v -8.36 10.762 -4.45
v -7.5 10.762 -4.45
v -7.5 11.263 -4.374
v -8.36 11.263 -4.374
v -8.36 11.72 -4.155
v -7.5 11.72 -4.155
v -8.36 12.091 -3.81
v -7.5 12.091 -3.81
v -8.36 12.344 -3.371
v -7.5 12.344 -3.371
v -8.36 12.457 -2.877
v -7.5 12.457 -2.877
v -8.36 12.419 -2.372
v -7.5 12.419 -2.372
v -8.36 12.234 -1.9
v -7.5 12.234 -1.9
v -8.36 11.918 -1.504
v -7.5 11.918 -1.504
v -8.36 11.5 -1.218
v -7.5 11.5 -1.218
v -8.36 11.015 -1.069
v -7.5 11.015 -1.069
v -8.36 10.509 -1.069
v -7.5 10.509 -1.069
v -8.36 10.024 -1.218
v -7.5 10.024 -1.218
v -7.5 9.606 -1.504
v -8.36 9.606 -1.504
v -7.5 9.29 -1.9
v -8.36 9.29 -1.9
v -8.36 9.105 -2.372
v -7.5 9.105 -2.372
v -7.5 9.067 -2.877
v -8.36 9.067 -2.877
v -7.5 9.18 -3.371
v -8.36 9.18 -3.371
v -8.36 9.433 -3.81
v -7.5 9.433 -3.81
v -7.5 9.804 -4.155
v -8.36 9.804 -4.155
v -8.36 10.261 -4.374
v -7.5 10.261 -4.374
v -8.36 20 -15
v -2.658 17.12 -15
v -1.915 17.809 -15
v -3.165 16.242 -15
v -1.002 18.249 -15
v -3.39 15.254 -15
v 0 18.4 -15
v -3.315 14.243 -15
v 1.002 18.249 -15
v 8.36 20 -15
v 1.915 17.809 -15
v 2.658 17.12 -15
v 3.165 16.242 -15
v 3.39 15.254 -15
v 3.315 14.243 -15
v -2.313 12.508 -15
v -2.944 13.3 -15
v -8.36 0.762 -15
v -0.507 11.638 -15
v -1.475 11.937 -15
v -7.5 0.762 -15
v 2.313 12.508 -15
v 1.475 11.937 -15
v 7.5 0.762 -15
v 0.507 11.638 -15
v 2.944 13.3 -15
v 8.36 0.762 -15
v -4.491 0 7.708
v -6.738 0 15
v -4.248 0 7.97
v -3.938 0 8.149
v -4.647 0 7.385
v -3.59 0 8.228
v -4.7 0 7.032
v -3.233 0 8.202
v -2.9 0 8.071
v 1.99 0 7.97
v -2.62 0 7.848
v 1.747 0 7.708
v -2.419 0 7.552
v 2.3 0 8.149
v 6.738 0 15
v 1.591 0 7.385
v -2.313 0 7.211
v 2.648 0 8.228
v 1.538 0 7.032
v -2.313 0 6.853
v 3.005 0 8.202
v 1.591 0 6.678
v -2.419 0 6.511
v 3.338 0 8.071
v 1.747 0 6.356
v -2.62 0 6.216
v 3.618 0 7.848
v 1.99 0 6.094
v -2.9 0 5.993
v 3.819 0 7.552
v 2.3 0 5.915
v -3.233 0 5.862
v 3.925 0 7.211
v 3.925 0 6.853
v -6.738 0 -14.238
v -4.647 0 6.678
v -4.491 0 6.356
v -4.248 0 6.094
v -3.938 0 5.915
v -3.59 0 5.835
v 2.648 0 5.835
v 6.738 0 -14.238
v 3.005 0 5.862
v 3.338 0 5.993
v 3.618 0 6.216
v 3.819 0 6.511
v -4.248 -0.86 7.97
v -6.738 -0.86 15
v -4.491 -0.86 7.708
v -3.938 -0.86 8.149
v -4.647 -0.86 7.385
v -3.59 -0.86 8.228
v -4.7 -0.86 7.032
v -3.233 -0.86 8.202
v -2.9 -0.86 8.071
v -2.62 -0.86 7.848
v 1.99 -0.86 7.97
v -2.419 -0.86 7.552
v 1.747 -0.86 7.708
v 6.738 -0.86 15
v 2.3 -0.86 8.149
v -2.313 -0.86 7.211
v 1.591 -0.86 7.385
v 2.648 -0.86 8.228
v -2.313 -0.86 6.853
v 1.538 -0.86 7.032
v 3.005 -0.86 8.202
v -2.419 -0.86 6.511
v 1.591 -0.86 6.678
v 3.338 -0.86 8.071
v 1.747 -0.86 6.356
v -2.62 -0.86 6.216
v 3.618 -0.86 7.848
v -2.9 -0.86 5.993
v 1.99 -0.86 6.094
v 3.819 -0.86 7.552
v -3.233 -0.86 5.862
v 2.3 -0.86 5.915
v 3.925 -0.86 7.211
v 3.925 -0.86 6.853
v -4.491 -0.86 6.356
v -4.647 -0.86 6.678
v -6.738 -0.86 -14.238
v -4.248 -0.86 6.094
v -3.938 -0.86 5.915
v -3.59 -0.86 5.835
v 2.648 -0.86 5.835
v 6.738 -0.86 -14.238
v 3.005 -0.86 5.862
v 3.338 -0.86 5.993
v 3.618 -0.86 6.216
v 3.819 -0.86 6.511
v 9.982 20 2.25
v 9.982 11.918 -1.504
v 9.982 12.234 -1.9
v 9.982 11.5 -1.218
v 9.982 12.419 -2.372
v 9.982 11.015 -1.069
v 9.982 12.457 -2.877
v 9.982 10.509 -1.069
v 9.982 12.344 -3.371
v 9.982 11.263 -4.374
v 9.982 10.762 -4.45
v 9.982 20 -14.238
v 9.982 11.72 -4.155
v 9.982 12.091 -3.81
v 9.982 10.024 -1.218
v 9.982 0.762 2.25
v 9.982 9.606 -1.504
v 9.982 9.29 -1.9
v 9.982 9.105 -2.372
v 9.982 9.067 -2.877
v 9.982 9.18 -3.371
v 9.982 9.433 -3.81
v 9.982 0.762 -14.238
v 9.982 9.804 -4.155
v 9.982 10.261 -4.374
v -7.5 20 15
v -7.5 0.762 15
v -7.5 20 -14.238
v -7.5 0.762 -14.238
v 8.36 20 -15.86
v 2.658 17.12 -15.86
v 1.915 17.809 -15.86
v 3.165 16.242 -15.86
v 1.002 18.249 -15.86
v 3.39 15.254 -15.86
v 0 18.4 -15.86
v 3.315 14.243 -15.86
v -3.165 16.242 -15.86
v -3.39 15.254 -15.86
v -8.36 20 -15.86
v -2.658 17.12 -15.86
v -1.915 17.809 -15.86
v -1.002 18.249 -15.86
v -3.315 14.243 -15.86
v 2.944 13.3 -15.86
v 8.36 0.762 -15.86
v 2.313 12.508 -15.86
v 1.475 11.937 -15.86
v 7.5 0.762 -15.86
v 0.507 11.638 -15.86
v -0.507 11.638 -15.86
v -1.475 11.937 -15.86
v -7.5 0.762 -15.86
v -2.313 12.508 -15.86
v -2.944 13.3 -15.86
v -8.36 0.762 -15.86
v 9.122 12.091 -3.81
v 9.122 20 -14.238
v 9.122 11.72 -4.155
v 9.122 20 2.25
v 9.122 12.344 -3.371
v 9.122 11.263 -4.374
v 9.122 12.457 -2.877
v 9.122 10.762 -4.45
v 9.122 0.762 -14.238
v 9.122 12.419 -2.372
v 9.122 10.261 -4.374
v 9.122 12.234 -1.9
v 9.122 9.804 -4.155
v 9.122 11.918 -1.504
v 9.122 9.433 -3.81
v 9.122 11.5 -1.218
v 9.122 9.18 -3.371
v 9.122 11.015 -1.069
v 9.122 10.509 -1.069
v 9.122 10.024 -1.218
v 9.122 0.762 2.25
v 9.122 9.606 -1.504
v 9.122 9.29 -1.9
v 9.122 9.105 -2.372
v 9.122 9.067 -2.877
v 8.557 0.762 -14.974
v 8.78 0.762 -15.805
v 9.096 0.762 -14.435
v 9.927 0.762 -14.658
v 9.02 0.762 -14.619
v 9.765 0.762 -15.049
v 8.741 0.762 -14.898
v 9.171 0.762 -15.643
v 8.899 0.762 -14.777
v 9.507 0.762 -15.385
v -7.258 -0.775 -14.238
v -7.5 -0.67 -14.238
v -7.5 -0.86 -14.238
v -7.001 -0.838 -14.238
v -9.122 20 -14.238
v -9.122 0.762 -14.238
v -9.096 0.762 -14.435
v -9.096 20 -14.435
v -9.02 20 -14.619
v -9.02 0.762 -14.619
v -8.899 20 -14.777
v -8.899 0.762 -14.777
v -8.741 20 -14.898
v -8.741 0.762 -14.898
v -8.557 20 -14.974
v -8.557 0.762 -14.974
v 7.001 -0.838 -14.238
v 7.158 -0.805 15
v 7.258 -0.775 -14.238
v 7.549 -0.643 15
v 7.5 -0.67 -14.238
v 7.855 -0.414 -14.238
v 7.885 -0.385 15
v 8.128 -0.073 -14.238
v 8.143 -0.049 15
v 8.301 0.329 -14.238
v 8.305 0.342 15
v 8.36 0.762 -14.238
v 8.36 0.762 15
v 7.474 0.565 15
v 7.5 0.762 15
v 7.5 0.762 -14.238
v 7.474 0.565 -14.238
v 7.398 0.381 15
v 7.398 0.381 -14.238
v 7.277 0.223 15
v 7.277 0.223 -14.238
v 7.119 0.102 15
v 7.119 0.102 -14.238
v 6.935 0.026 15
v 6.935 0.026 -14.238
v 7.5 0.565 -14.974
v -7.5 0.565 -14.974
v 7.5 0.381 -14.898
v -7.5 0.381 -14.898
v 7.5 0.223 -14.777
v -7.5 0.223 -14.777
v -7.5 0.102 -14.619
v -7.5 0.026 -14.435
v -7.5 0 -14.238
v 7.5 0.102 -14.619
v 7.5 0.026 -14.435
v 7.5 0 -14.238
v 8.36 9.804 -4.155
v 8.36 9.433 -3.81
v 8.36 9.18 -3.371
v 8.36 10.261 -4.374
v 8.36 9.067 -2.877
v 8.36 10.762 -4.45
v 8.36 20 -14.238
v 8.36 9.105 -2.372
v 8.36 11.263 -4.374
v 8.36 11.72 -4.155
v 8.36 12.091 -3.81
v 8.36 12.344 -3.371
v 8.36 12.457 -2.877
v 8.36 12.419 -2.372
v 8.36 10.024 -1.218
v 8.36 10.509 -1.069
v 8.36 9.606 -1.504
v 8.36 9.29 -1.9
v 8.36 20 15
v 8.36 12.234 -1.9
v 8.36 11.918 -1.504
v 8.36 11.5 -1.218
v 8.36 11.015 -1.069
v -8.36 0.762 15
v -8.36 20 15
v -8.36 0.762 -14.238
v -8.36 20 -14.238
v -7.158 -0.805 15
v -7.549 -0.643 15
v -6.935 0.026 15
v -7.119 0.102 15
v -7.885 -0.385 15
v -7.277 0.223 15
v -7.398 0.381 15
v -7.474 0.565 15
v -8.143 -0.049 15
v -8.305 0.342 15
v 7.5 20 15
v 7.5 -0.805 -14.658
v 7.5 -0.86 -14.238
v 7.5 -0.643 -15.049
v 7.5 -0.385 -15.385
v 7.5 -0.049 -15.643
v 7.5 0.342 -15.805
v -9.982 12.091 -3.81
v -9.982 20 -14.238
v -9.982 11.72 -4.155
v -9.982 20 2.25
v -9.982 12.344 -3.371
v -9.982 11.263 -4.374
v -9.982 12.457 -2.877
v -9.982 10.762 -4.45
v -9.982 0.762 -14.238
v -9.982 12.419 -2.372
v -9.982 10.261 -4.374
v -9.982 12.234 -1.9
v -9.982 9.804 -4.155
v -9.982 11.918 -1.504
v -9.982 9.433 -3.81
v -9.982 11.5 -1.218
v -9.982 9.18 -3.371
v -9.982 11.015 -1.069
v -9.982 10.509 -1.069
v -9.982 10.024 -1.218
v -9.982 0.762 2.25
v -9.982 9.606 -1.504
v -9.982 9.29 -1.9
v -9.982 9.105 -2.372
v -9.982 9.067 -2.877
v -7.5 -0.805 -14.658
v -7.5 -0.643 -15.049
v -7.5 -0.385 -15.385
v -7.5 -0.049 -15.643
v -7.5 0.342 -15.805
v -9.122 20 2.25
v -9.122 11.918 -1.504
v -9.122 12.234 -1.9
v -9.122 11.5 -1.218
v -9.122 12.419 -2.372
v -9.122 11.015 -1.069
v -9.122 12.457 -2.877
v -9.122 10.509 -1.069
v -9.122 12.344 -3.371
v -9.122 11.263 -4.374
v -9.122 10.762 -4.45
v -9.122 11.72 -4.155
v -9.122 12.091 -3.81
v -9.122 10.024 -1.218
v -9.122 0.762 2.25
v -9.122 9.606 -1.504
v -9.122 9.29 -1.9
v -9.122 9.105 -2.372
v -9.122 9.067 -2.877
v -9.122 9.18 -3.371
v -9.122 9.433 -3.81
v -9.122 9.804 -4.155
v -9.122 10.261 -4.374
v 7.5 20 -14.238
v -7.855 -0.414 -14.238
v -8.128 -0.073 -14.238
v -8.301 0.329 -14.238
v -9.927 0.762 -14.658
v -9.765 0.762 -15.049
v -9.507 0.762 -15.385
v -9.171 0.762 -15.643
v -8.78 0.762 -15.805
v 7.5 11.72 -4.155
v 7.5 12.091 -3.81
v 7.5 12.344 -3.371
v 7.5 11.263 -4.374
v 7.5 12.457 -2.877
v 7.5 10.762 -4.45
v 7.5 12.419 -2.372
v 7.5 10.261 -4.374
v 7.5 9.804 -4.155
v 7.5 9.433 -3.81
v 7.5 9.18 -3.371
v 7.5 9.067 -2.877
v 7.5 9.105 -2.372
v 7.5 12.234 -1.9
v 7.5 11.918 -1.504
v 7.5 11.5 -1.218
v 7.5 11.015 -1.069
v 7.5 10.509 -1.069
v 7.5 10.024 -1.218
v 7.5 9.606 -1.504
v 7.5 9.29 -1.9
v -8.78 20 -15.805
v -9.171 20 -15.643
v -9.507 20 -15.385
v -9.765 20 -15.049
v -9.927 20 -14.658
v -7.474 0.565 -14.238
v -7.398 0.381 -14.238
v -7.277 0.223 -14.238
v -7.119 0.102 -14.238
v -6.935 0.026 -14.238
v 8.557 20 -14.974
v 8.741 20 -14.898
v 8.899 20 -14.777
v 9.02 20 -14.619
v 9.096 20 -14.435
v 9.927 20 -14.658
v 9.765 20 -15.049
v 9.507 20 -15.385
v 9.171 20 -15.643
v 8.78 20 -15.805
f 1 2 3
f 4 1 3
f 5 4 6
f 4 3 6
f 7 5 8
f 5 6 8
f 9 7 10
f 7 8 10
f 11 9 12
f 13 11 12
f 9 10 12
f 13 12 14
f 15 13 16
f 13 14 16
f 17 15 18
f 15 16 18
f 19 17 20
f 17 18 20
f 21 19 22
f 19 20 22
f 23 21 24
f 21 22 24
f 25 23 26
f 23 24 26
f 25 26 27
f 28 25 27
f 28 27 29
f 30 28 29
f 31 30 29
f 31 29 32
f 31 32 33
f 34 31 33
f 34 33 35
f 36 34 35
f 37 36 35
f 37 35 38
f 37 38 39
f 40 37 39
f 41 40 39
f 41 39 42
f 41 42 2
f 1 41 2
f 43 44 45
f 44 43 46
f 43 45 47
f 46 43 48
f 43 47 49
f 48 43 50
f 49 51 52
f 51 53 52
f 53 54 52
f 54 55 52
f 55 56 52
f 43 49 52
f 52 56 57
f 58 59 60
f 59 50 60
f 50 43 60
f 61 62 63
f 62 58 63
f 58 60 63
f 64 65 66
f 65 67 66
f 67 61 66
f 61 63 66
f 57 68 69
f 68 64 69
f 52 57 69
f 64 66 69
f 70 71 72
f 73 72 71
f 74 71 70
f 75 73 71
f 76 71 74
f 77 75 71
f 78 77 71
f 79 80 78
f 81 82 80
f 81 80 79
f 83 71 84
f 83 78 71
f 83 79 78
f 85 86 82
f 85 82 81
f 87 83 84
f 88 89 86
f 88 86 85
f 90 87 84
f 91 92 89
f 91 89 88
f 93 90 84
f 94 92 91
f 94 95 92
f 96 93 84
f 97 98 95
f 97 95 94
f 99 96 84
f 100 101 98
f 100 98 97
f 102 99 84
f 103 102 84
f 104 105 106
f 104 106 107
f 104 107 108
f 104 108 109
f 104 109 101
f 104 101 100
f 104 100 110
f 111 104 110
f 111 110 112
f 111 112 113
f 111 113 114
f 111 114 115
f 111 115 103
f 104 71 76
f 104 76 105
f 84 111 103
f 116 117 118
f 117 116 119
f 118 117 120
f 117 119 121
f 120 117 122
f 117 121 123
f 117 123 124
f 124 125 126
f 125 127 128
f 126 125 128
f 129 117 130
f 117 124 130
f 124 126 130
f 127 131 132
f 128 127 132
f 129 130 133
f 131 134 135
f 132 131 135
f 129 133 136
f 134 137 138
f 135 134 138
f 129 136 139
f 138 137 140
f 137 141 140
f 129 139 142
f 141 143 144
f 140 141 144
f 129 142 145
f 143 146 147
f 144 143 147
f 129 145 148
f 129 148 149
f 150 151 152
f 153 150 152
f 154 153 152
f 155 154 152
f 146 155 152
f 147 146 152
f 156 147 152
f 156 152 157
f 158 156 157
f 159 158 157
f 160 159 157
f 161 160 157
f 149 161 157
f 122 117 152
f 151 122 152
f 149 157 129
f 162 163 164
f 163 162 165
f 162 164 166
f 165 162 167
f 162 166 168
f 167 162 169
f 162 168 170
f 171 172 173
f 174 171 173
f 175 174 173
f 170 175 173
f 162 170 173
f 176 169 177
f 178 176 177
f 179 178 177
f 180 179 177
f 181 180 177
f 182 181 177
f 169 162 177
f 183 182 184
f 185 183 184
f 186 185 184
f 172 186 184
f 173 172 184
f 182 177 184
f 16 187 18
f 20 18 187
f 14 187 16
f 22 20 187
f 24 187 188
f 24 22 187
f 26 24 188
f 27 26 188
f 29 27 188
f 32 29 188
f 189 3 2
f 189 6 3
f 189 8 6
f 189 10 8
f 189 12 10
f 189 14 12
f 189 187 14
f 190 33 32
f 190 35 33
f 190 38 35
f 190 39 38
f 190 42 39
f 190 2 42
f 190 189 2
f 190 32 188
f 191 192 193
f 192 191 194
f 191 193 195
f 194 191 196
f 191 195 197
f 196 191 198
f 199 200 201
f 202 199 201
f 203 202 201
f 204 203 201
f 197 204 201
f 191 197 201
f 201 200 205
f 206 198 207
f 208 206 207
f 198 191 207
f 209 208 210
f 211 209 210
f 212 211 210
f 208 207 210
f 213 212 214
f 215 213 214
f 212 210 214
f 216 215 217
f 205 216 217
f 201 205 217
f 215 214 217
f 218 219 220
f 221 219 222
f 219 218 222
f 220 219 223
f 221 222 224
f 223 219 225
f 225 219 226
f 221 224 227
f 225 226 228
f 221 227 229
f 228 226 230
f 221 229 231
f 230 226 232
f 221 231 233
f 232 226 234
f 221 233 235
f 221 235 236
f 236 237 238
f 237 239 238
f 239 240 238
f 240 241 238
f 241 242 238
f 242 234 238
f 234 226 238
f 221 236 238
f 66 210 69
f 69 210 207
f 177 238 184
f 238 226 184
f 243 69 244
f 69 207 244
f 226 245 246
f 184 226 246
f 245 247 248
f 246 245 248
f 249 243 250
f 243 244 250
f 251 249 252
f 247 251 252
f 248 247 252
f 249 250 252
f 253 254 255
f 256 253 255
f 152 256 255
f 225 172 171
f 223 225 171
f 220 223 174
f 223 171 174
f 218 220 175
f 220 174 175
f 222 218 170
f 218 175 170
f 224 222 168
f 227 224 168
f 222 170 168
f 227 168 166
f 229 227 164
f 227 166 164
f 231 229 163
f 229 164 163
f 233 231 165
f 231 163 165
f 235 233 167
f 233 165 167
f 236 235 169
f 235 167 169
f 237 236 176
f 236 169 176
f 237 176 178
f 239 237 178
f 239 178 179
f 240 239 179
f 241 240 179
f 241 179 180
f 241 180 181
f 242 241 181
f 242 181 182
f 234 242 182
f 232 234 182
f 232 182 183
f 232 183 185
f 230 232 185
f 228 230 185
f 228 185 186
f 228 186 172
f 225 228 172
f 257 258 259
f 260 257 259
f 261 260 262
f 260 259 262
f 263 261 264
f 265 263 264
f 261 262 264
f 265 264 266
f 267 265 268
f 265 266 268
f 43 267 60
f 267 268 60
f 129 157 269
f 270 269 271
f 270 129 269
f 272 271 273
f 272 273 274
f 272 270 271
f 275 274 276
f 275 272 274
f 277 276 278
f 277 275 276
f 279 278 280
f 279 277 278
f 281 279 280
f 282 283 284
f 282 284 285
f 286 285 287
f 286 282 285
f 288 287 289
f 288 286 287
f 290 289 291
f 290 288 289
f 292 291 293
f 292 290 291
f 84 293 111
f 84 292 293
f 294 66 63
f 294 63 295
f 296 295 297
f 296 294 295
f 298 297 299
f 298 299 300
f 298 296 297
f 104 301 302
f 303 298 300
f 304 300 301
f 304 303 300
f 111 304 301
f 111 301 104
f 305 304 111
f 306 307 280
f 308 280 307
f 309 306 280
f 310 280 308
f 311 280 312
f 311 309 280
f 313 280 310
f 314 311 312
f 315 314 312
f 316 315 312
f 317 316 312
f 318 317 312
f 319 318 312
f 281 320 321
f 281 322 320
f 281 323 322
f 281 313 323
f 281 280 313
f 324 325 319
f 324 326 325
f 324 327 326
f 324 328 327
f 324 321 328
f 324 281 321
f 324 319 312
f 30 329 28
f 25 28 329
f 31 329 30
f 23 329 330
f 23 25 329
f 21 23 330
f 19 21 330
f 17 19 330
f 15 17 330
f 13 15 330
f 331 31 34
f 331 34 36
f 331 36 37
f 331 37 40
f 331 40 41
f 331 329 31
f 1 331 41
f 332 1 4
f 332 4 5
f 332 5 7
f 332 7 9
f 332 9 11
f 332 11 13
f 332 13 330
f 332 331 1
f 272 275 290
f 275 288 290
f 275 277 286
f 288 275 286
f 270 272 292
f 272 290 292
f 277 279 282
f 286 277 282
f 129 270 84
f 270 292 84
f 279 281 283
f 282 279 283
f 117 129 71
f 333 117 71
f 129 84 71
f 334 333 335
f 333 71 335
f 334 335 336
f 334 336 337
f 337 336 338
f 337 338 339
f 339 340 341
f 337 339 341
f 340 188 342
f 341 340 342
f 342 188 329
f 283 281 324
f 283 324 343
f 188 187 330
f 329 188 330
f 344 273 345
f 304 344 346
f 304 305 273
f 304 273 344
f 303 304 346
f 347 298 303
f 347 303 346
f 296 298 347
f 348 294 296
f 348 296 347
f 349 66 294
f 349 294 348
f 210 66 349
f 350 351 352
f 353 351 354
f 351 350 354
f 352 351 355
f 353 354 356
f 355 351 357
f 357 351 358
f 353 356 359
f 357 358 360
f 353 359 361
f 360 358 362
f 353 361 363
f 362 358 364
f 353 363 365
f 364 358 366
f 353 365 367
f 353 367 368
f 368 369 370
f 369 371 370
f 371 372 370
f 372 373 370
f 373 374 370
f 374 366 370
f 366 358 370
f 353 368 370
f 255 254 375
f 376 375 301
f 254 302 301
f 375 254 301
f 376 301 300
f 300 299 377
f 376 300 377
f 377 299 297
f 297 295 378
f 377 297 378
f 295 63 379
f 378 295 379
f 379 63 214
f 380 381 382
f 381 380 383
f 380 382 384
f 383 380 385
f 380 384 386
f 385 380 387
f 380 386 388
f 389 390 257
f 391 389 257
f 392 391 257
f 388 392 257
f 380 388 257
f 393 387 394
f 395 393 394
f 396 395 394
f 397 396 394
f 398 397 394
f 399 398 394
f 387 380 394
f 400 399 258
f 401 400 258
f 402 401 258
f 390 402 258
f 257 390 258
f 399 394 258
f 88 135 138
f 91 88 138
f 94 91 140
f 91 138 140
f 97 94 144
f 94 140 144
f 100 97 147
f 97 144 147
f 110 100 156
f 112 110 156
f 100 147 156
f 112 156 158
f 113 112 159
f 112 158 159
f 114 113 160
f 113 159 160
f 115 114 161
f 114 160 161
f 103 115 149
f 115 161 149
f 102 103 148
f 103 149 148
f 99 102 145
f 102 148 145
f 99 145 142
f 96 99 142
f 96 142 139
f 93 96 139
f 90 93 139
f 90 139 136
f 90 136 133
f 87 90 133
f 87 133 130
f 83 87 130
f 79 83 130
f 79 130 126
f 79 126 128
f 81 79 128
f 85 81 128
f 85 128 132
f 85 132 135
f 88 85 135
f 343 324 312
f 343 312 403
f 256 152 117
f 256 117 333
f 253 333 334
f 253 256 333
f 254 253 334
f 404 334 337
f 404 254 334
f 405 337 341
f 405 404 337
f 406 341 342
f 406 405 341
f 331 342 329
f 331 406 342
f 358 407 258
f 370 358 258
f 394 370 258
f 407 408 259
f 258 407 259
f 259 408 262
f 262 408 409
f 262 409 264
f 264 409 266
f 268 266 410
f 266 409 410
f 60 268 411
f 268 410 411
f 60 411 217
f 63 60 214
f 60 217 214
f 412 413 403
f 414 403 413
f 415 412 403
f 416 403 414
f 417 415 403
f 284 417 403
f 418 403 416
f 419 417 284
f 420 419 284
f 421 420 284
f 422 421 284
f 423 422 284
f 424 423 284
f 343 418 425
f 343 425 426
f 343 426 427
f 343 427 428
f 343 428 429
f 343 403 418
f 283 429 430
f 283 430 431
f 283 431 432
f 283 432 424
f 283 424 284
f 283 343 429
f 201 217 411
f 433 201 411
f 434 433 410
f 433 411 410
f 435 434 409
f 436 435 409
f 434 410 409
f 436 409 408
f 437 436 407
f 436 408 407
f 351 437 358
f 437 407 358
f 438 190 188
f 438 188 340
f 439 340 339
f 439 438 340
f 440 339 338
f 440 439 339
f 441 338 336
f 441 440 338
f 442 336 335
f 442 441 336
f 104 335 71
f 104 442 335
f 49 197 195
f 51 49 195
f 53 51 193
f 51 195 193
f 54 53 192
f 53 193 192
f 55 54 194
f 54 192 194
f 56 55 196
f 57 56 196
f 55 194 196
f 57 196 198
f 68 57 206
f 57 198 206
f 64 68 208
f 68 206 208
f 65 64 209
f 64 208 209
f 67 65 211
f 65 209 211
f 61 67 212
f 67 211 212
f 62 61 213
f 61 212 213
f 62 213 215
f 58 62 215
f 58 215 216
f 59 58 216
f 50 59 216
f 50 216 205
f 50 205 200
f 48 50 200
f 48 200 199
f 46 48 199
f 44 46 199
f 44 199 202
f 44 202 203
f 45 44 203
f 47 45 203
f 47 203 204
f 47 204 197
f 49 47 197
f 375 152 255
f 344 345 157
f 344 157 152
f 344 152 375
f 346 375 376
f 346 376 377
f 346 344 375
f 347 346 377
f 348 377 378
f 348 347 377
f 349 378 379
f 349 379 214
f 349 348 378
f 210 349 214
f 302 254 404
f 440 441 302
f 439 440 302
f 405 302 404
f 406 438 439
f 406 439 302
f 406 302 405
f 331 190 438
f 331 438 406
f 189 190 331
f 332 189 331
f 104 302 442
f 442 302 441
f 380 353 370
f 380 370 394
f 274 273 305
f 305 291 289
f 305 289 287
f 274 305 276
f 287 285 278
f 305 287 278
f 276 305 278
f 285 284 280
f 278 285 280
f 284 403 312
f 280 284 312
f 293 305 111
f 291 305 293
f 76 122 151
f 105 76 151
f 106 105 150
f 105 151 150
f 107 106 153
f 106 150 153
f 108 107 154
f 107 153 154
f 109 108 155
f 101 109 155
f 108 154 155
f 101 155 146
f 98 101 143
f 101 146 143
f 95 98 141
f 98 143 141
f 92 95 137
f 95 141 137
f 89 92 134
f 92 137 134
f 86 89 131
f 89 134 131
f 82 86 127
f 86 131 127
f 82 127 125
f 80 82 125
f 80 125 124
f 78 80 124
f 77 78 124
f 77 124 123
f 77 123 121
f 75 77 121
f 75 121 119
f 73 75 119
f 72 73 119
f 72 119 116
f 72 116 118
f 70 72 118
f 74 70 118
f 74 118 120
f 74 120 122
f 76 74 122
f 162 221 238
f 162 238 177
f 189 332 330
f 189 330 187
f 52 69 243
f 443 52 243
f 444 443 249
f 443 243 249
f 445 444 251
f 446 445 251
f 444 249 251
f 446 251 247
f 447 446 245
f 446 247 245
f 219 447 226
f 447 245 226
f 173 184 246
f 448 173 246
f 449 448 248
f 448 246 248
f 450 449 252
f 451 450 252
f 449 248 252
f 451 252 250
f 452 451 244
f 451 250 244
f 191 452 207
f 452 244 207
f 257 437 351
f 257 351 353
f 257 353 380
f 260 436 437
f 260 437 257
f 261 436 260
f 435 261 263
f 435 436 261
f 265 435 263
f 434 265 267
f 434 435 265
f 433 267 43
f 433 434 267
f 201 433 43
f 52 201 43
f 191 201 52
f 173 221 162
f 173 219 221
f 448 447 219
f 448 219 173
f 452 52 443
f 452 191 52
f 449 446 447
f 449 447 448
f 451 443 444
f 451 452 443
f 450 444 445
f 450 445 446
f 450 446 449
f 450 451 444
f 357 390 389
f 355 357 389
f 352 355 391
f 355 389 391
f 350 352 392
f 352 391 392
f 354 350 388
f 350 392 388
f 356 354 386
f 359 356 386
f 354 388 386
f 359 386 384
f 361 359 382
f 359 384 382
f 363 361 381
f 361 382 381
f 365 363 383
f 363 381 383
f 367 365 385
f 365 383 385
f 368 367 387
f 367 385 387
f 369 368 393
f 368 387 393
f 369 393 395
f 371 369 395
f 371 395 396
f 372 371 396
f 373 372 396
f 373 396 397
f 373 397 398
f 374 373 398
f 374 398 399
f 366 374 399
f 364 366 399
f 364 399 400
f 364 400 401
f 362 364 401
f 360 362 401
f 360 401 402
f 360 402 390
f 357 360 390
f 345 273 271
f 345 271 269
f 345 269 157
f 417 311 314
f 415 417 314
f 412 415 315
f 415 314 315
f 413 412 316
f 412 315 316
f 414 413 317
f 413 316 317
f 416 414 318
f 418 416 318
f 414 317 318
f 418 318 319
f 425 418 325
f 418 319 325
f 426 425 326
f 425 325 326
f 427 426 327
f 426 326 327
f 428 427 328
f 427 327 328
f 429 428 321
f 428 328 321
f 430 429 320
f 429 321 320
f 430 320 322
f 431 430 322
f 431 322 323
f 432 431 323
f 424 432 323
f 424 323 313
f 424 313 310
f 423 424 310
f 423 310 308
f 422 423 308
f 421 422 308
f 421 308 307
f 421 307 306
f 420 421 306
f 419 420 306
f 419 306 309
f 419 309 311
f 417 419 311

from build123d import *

# Parameters (mm, degrees)
SKETCH1_W                    = 15
SKETCH1_H                    = 30
BASE_FLANGE1_DEPTH           = 0.86
EDGE_FLANGE1_STRIP_W         = 4.964
EDGE_FLANGE1_STRIP_H         = 0.86
EDGE_FLANGE1_STRIP_CUT_DEPTH = 15
EDGE_FLANGE1_DEPTH           = 15
EDGE_FLANGE2_STRIP_W         = 4.964
EDGE_FLANGE2_STRIP_H         = 0.86
EDGE_FLANGE2_STRIP_CUT_DEPTH = 29.238
EDGE_FLANGE2_DEPTH           = 29.238
EDGE_FLANGE3_STRIP_W         = 4.964
EDGE_FLANGE3_STRIP_H         = 0.86
EDGE_FLANGE3_STRIP_CUT_DEPTH = 29.238
EDGE_FLANGE3_DEPTH           = 29.238
EDGE_FLANGE4_START           = 0.762
EDGE_FLANGE4_DEPTH           = 19.238
EDGE_FLANGE5_START           = 0.762
EDGE_FLANGE5_DEPTH           = 19.238
SKETCH21_R                   = 3.4
CUT_EXTRUDE1_DEPTH           = 10
M3_CLEARANCE_HOLE2_D         = 3.4
M2_CLEARANCE_HOLE1_D         = 2.4
M2_CLEARANCE_HOLE1_DEPTH     = 12
M2_CLEARANCE_HOLE1_TIP       = 0.721032743


# Read off the part's stored shape, not the designer's step: Edge-Flange4, Edge-Flange5
# Sheet-metal steps are written as plain solids
with BuildPart() as part:
    # Sketch1 → Base-Flange1 (new body)
    with BuildSketch(Plane(origin=(0, 0, 0), x_dir=(1, 0, 0), z_dir=(0, 1, 0))):
        Rectangle(SKETCH1_W, SKETCH1_H)
    extrude(amount=-BASE_FLANGE1_DEPTH)

    # Edge-Flange1 strip (across the edge) → Edge-Flange1 strip cut (cut)
    with BuildSketch(Plane(origin=(7.5, 0, -15), x_dir=(0, 0, 1), z_dir=(-1, 0, 0))):
        with Locations((-1.72, -0.43)):
            Rectangle(EDGE_FLANGE1_STRIP_W, EDGE_FLANGE1_STRIP_H)
    extrude(amount=EDGE_FLANGE1_STRIP_CUT_DEPTH, mode=Mode.SUBTRACT)

    # Edge-Flange1 section (across the edge) → Edge-Flange1 (add)
    with BuildSketch(Plane(origin=(7.5, 0, -15), x_dir=(0, 0, 1), z_dir=(-1, 0, 0))):
        with BuildLine():
            Line((-0.86, 0.762), (-0.86, 20))
            Line((-0.86, 20), (0, 20))
            Line((0, 20), (0, 0.762))
            ThreePointArc((0, 0.762), (0.223184633, 0.223184633), (0.762, 0))
            Line((0.762, 0), (0.762, -0.86))
            ThreePointArc((0.762, -0.86), (-0.384927199, -0.384927199), (-0.86, 0.762))
        make_face()
    extrude(amount=EDGE_FLANGE1_DEPTH)

    # Edge-Flange2 strip (across the edge) → Edge-Flange2 strip cut (cut)
    with BuildSketch(Plane(origin=(7.5, 0, 15), x_dir=(-1, 0, 0), z_dir=(0, 0, -1))):
        with Locations((-1.72, -0.43)):
            Rectangle(EDGE_FLANGE2_STRIP_W, EDGE_FLANGE2_STRIP_H)
    extrude(amount=EDGE_FLANGE2_STRIP_CUT_DEPTH, mode=Mode.SUBTRACT)

    # Edge-Flange2 section (across the edge) → Edge-Flange2 (add)
    with BuildSketch(Plane(origin=(7.5, 0, 15), x_dir=(-1, 0, 0), z_dir=(0, 0, -1))):
        with BuildLine():
            Line((-0.86, 0.762), (-0.86, 20))
            Line((-0.86, 20), (0, 20))
            Line((0, 20), (0, 0.762))
            ThreePointArc((0, 0.762), (0.223184633, 0.223184633), (0.762, 0))
            Line((0.762, 0), (0.762, -0.86))
            ThreePointArc((0.762, -0.86), (-0.384927199, -0.384927199), (-0.86, 0.762))
        make_face()
    extrude(amount=EDGE_FLANGE2_DEPTH)

    # Edge-Flange3 strip (across the edge) → Edge-Flange3 strip cut (cut)
    with BuildSketch(Plane(origin=(-7.5, 0, -14.238), x_dir=(1, 0, 0), z_dir=(0, 0, 1))):
        with Locations((-1.72, -0.43)):
            Rectangle(EDGE_FLANGE3_STRIP_W, EDGE_FLANGE3_STRIP_H)
    extrude(amount=EDGE_FLANGE3_STRIP_CUT_DEPTH, mode=Mode.SUBTRACT)

    # Edge-Flange3 section (across the edge) → Edge-Flange3 (add)
    with BuildSketch(Plane(origin=(-7.5, 0, -14.238), x_dir=(1, 0, 0), z_dir=(0, 0, 1))):
        with BuildLine():
            Line((-0.86, 0.762), (-0.86, 20))
            Line((-0.86, 20), (0, 20))
            Line((0, 20), (0, 0.762))
            ThreePointArc((0, 0.762), (0.223184633, 0.223184633), (0.762, 0))
            Line((0.762, 0), (0.762, -0.86))
            ThreePointArc((0.762, -0.86), (-0.384927199, -0.384927199), (-0.86, 0.762))
        make_face()
    extrude(amount=EDGE_FLANGE3_DEPTH)

    # Edge-Flange4 outline → Edge-Flange4 (add)
    with BuildSketch(Plane(origin=(0, 0, 0), x_dir=(1, 0, 0), z_dir=(0, 1, 0)).offset(EDGE_FLANGE4_START)):
        with BuildLine():
            ThreePointArc((-8.36, 15.86), (-9.506927199, 15.384927199), (-9.982, 14.238))
            Line((-9.982, 14.238), (-9.982, -2.25))
            Line((-9.982, -2.25), (-9.122, -2.25))
            Line((-9.122, -2.25), (-9.122, 14.238))
            ThreePointArc((-9.122, 14.238), (-8.898815367, 14.776815367), (-8.36, 15))
            Line((-8.36, 15), (-7.5, 15))
            Line((-7.5, 15), (-7.5, 15.86))
            Line((-7.5, 15.86), (-8.36, 15.86))
        make_face()
    extrude(amount=EDGE_FLANGE4_DEPTH)

    # Edge-Flange5 outline → Edge-Flange5 (add)
    with BuildSketch(Plane(origin=(0, 0, 0), x_dir=(1, 0, 0), z_dir=(0, 1, 0)).offset(EDGE_FLANGE5_START)):
        with BuildLine():
            Line((9.122, -2.25), (9.982, -2.25))
            Line((9.982, -2.25), (9.982, 14.238))
            ThreePointArc((9.982, 14.238), (9.506927199, 15.384927199), (8.36, 15.86))
            Line((8.36, 15.86), (7.5, 15.86))
            Line((7.5, 15.86), (7.5, 15))
            Line((7.5, 15), (8.36, 15))
            ThreePointArc((8.36, 15), (8.898815367, 14.776815367), (9.122, 14.238))
            Line((9.122, 14.238), (9.122, -2.25))
        make_face()
    extrude(amount=EDGE_FLANGE5_DEPTH)

    # Sketch21 → Cut-Extrude1 (cut)
    with BuildSketch(Plane(origin=(0, 0, -15.86), x_dir=(-1, 0, 0), z_dir=(0, 0, -1))):
        with Locations(Location((0, 15, 0), (0, 0, 90))):
            Circle(SKETCH21_R)
    extrude(amount=-CUT_EXTRUDE1_DEPTH, mode=Mode.SUBTRACT)

    # M3 Clearance Hole2 (through all)
    with Locations(Plane.ZY.offset(9.982)):
        with Locations((-2.75, 10.762)):
            Hole(M3_CLEARANCE_HOLE2_D / 2)

    # M2 Clearance Hole1
    with Locations(Plane(origin=(0, 0, 0), x_dir=(1, 0, 0), z_dir=(0, 1, 0))):
        with Locations((2.738, -7.031765706), (-3.5, -7.031765706)):
            Hole(M2_CLEARANCE_HOLE1_D / 2, depth=M2_CLEARANCE_HOLE1_DEPTH)
            with Locations((0, 0, -(M2_CLEARANCE_HOLE1_DEPTH + M2_CLEARANCE_HOLE1_TIP / 2))):  # 118° drill point
                Cone(0, M2_CLEARANCE_HOLE1_D / 2, M2_CLEARANCE_HOLE1_TIP, mode=Mode.SUBTRACT)


solid = part.part
